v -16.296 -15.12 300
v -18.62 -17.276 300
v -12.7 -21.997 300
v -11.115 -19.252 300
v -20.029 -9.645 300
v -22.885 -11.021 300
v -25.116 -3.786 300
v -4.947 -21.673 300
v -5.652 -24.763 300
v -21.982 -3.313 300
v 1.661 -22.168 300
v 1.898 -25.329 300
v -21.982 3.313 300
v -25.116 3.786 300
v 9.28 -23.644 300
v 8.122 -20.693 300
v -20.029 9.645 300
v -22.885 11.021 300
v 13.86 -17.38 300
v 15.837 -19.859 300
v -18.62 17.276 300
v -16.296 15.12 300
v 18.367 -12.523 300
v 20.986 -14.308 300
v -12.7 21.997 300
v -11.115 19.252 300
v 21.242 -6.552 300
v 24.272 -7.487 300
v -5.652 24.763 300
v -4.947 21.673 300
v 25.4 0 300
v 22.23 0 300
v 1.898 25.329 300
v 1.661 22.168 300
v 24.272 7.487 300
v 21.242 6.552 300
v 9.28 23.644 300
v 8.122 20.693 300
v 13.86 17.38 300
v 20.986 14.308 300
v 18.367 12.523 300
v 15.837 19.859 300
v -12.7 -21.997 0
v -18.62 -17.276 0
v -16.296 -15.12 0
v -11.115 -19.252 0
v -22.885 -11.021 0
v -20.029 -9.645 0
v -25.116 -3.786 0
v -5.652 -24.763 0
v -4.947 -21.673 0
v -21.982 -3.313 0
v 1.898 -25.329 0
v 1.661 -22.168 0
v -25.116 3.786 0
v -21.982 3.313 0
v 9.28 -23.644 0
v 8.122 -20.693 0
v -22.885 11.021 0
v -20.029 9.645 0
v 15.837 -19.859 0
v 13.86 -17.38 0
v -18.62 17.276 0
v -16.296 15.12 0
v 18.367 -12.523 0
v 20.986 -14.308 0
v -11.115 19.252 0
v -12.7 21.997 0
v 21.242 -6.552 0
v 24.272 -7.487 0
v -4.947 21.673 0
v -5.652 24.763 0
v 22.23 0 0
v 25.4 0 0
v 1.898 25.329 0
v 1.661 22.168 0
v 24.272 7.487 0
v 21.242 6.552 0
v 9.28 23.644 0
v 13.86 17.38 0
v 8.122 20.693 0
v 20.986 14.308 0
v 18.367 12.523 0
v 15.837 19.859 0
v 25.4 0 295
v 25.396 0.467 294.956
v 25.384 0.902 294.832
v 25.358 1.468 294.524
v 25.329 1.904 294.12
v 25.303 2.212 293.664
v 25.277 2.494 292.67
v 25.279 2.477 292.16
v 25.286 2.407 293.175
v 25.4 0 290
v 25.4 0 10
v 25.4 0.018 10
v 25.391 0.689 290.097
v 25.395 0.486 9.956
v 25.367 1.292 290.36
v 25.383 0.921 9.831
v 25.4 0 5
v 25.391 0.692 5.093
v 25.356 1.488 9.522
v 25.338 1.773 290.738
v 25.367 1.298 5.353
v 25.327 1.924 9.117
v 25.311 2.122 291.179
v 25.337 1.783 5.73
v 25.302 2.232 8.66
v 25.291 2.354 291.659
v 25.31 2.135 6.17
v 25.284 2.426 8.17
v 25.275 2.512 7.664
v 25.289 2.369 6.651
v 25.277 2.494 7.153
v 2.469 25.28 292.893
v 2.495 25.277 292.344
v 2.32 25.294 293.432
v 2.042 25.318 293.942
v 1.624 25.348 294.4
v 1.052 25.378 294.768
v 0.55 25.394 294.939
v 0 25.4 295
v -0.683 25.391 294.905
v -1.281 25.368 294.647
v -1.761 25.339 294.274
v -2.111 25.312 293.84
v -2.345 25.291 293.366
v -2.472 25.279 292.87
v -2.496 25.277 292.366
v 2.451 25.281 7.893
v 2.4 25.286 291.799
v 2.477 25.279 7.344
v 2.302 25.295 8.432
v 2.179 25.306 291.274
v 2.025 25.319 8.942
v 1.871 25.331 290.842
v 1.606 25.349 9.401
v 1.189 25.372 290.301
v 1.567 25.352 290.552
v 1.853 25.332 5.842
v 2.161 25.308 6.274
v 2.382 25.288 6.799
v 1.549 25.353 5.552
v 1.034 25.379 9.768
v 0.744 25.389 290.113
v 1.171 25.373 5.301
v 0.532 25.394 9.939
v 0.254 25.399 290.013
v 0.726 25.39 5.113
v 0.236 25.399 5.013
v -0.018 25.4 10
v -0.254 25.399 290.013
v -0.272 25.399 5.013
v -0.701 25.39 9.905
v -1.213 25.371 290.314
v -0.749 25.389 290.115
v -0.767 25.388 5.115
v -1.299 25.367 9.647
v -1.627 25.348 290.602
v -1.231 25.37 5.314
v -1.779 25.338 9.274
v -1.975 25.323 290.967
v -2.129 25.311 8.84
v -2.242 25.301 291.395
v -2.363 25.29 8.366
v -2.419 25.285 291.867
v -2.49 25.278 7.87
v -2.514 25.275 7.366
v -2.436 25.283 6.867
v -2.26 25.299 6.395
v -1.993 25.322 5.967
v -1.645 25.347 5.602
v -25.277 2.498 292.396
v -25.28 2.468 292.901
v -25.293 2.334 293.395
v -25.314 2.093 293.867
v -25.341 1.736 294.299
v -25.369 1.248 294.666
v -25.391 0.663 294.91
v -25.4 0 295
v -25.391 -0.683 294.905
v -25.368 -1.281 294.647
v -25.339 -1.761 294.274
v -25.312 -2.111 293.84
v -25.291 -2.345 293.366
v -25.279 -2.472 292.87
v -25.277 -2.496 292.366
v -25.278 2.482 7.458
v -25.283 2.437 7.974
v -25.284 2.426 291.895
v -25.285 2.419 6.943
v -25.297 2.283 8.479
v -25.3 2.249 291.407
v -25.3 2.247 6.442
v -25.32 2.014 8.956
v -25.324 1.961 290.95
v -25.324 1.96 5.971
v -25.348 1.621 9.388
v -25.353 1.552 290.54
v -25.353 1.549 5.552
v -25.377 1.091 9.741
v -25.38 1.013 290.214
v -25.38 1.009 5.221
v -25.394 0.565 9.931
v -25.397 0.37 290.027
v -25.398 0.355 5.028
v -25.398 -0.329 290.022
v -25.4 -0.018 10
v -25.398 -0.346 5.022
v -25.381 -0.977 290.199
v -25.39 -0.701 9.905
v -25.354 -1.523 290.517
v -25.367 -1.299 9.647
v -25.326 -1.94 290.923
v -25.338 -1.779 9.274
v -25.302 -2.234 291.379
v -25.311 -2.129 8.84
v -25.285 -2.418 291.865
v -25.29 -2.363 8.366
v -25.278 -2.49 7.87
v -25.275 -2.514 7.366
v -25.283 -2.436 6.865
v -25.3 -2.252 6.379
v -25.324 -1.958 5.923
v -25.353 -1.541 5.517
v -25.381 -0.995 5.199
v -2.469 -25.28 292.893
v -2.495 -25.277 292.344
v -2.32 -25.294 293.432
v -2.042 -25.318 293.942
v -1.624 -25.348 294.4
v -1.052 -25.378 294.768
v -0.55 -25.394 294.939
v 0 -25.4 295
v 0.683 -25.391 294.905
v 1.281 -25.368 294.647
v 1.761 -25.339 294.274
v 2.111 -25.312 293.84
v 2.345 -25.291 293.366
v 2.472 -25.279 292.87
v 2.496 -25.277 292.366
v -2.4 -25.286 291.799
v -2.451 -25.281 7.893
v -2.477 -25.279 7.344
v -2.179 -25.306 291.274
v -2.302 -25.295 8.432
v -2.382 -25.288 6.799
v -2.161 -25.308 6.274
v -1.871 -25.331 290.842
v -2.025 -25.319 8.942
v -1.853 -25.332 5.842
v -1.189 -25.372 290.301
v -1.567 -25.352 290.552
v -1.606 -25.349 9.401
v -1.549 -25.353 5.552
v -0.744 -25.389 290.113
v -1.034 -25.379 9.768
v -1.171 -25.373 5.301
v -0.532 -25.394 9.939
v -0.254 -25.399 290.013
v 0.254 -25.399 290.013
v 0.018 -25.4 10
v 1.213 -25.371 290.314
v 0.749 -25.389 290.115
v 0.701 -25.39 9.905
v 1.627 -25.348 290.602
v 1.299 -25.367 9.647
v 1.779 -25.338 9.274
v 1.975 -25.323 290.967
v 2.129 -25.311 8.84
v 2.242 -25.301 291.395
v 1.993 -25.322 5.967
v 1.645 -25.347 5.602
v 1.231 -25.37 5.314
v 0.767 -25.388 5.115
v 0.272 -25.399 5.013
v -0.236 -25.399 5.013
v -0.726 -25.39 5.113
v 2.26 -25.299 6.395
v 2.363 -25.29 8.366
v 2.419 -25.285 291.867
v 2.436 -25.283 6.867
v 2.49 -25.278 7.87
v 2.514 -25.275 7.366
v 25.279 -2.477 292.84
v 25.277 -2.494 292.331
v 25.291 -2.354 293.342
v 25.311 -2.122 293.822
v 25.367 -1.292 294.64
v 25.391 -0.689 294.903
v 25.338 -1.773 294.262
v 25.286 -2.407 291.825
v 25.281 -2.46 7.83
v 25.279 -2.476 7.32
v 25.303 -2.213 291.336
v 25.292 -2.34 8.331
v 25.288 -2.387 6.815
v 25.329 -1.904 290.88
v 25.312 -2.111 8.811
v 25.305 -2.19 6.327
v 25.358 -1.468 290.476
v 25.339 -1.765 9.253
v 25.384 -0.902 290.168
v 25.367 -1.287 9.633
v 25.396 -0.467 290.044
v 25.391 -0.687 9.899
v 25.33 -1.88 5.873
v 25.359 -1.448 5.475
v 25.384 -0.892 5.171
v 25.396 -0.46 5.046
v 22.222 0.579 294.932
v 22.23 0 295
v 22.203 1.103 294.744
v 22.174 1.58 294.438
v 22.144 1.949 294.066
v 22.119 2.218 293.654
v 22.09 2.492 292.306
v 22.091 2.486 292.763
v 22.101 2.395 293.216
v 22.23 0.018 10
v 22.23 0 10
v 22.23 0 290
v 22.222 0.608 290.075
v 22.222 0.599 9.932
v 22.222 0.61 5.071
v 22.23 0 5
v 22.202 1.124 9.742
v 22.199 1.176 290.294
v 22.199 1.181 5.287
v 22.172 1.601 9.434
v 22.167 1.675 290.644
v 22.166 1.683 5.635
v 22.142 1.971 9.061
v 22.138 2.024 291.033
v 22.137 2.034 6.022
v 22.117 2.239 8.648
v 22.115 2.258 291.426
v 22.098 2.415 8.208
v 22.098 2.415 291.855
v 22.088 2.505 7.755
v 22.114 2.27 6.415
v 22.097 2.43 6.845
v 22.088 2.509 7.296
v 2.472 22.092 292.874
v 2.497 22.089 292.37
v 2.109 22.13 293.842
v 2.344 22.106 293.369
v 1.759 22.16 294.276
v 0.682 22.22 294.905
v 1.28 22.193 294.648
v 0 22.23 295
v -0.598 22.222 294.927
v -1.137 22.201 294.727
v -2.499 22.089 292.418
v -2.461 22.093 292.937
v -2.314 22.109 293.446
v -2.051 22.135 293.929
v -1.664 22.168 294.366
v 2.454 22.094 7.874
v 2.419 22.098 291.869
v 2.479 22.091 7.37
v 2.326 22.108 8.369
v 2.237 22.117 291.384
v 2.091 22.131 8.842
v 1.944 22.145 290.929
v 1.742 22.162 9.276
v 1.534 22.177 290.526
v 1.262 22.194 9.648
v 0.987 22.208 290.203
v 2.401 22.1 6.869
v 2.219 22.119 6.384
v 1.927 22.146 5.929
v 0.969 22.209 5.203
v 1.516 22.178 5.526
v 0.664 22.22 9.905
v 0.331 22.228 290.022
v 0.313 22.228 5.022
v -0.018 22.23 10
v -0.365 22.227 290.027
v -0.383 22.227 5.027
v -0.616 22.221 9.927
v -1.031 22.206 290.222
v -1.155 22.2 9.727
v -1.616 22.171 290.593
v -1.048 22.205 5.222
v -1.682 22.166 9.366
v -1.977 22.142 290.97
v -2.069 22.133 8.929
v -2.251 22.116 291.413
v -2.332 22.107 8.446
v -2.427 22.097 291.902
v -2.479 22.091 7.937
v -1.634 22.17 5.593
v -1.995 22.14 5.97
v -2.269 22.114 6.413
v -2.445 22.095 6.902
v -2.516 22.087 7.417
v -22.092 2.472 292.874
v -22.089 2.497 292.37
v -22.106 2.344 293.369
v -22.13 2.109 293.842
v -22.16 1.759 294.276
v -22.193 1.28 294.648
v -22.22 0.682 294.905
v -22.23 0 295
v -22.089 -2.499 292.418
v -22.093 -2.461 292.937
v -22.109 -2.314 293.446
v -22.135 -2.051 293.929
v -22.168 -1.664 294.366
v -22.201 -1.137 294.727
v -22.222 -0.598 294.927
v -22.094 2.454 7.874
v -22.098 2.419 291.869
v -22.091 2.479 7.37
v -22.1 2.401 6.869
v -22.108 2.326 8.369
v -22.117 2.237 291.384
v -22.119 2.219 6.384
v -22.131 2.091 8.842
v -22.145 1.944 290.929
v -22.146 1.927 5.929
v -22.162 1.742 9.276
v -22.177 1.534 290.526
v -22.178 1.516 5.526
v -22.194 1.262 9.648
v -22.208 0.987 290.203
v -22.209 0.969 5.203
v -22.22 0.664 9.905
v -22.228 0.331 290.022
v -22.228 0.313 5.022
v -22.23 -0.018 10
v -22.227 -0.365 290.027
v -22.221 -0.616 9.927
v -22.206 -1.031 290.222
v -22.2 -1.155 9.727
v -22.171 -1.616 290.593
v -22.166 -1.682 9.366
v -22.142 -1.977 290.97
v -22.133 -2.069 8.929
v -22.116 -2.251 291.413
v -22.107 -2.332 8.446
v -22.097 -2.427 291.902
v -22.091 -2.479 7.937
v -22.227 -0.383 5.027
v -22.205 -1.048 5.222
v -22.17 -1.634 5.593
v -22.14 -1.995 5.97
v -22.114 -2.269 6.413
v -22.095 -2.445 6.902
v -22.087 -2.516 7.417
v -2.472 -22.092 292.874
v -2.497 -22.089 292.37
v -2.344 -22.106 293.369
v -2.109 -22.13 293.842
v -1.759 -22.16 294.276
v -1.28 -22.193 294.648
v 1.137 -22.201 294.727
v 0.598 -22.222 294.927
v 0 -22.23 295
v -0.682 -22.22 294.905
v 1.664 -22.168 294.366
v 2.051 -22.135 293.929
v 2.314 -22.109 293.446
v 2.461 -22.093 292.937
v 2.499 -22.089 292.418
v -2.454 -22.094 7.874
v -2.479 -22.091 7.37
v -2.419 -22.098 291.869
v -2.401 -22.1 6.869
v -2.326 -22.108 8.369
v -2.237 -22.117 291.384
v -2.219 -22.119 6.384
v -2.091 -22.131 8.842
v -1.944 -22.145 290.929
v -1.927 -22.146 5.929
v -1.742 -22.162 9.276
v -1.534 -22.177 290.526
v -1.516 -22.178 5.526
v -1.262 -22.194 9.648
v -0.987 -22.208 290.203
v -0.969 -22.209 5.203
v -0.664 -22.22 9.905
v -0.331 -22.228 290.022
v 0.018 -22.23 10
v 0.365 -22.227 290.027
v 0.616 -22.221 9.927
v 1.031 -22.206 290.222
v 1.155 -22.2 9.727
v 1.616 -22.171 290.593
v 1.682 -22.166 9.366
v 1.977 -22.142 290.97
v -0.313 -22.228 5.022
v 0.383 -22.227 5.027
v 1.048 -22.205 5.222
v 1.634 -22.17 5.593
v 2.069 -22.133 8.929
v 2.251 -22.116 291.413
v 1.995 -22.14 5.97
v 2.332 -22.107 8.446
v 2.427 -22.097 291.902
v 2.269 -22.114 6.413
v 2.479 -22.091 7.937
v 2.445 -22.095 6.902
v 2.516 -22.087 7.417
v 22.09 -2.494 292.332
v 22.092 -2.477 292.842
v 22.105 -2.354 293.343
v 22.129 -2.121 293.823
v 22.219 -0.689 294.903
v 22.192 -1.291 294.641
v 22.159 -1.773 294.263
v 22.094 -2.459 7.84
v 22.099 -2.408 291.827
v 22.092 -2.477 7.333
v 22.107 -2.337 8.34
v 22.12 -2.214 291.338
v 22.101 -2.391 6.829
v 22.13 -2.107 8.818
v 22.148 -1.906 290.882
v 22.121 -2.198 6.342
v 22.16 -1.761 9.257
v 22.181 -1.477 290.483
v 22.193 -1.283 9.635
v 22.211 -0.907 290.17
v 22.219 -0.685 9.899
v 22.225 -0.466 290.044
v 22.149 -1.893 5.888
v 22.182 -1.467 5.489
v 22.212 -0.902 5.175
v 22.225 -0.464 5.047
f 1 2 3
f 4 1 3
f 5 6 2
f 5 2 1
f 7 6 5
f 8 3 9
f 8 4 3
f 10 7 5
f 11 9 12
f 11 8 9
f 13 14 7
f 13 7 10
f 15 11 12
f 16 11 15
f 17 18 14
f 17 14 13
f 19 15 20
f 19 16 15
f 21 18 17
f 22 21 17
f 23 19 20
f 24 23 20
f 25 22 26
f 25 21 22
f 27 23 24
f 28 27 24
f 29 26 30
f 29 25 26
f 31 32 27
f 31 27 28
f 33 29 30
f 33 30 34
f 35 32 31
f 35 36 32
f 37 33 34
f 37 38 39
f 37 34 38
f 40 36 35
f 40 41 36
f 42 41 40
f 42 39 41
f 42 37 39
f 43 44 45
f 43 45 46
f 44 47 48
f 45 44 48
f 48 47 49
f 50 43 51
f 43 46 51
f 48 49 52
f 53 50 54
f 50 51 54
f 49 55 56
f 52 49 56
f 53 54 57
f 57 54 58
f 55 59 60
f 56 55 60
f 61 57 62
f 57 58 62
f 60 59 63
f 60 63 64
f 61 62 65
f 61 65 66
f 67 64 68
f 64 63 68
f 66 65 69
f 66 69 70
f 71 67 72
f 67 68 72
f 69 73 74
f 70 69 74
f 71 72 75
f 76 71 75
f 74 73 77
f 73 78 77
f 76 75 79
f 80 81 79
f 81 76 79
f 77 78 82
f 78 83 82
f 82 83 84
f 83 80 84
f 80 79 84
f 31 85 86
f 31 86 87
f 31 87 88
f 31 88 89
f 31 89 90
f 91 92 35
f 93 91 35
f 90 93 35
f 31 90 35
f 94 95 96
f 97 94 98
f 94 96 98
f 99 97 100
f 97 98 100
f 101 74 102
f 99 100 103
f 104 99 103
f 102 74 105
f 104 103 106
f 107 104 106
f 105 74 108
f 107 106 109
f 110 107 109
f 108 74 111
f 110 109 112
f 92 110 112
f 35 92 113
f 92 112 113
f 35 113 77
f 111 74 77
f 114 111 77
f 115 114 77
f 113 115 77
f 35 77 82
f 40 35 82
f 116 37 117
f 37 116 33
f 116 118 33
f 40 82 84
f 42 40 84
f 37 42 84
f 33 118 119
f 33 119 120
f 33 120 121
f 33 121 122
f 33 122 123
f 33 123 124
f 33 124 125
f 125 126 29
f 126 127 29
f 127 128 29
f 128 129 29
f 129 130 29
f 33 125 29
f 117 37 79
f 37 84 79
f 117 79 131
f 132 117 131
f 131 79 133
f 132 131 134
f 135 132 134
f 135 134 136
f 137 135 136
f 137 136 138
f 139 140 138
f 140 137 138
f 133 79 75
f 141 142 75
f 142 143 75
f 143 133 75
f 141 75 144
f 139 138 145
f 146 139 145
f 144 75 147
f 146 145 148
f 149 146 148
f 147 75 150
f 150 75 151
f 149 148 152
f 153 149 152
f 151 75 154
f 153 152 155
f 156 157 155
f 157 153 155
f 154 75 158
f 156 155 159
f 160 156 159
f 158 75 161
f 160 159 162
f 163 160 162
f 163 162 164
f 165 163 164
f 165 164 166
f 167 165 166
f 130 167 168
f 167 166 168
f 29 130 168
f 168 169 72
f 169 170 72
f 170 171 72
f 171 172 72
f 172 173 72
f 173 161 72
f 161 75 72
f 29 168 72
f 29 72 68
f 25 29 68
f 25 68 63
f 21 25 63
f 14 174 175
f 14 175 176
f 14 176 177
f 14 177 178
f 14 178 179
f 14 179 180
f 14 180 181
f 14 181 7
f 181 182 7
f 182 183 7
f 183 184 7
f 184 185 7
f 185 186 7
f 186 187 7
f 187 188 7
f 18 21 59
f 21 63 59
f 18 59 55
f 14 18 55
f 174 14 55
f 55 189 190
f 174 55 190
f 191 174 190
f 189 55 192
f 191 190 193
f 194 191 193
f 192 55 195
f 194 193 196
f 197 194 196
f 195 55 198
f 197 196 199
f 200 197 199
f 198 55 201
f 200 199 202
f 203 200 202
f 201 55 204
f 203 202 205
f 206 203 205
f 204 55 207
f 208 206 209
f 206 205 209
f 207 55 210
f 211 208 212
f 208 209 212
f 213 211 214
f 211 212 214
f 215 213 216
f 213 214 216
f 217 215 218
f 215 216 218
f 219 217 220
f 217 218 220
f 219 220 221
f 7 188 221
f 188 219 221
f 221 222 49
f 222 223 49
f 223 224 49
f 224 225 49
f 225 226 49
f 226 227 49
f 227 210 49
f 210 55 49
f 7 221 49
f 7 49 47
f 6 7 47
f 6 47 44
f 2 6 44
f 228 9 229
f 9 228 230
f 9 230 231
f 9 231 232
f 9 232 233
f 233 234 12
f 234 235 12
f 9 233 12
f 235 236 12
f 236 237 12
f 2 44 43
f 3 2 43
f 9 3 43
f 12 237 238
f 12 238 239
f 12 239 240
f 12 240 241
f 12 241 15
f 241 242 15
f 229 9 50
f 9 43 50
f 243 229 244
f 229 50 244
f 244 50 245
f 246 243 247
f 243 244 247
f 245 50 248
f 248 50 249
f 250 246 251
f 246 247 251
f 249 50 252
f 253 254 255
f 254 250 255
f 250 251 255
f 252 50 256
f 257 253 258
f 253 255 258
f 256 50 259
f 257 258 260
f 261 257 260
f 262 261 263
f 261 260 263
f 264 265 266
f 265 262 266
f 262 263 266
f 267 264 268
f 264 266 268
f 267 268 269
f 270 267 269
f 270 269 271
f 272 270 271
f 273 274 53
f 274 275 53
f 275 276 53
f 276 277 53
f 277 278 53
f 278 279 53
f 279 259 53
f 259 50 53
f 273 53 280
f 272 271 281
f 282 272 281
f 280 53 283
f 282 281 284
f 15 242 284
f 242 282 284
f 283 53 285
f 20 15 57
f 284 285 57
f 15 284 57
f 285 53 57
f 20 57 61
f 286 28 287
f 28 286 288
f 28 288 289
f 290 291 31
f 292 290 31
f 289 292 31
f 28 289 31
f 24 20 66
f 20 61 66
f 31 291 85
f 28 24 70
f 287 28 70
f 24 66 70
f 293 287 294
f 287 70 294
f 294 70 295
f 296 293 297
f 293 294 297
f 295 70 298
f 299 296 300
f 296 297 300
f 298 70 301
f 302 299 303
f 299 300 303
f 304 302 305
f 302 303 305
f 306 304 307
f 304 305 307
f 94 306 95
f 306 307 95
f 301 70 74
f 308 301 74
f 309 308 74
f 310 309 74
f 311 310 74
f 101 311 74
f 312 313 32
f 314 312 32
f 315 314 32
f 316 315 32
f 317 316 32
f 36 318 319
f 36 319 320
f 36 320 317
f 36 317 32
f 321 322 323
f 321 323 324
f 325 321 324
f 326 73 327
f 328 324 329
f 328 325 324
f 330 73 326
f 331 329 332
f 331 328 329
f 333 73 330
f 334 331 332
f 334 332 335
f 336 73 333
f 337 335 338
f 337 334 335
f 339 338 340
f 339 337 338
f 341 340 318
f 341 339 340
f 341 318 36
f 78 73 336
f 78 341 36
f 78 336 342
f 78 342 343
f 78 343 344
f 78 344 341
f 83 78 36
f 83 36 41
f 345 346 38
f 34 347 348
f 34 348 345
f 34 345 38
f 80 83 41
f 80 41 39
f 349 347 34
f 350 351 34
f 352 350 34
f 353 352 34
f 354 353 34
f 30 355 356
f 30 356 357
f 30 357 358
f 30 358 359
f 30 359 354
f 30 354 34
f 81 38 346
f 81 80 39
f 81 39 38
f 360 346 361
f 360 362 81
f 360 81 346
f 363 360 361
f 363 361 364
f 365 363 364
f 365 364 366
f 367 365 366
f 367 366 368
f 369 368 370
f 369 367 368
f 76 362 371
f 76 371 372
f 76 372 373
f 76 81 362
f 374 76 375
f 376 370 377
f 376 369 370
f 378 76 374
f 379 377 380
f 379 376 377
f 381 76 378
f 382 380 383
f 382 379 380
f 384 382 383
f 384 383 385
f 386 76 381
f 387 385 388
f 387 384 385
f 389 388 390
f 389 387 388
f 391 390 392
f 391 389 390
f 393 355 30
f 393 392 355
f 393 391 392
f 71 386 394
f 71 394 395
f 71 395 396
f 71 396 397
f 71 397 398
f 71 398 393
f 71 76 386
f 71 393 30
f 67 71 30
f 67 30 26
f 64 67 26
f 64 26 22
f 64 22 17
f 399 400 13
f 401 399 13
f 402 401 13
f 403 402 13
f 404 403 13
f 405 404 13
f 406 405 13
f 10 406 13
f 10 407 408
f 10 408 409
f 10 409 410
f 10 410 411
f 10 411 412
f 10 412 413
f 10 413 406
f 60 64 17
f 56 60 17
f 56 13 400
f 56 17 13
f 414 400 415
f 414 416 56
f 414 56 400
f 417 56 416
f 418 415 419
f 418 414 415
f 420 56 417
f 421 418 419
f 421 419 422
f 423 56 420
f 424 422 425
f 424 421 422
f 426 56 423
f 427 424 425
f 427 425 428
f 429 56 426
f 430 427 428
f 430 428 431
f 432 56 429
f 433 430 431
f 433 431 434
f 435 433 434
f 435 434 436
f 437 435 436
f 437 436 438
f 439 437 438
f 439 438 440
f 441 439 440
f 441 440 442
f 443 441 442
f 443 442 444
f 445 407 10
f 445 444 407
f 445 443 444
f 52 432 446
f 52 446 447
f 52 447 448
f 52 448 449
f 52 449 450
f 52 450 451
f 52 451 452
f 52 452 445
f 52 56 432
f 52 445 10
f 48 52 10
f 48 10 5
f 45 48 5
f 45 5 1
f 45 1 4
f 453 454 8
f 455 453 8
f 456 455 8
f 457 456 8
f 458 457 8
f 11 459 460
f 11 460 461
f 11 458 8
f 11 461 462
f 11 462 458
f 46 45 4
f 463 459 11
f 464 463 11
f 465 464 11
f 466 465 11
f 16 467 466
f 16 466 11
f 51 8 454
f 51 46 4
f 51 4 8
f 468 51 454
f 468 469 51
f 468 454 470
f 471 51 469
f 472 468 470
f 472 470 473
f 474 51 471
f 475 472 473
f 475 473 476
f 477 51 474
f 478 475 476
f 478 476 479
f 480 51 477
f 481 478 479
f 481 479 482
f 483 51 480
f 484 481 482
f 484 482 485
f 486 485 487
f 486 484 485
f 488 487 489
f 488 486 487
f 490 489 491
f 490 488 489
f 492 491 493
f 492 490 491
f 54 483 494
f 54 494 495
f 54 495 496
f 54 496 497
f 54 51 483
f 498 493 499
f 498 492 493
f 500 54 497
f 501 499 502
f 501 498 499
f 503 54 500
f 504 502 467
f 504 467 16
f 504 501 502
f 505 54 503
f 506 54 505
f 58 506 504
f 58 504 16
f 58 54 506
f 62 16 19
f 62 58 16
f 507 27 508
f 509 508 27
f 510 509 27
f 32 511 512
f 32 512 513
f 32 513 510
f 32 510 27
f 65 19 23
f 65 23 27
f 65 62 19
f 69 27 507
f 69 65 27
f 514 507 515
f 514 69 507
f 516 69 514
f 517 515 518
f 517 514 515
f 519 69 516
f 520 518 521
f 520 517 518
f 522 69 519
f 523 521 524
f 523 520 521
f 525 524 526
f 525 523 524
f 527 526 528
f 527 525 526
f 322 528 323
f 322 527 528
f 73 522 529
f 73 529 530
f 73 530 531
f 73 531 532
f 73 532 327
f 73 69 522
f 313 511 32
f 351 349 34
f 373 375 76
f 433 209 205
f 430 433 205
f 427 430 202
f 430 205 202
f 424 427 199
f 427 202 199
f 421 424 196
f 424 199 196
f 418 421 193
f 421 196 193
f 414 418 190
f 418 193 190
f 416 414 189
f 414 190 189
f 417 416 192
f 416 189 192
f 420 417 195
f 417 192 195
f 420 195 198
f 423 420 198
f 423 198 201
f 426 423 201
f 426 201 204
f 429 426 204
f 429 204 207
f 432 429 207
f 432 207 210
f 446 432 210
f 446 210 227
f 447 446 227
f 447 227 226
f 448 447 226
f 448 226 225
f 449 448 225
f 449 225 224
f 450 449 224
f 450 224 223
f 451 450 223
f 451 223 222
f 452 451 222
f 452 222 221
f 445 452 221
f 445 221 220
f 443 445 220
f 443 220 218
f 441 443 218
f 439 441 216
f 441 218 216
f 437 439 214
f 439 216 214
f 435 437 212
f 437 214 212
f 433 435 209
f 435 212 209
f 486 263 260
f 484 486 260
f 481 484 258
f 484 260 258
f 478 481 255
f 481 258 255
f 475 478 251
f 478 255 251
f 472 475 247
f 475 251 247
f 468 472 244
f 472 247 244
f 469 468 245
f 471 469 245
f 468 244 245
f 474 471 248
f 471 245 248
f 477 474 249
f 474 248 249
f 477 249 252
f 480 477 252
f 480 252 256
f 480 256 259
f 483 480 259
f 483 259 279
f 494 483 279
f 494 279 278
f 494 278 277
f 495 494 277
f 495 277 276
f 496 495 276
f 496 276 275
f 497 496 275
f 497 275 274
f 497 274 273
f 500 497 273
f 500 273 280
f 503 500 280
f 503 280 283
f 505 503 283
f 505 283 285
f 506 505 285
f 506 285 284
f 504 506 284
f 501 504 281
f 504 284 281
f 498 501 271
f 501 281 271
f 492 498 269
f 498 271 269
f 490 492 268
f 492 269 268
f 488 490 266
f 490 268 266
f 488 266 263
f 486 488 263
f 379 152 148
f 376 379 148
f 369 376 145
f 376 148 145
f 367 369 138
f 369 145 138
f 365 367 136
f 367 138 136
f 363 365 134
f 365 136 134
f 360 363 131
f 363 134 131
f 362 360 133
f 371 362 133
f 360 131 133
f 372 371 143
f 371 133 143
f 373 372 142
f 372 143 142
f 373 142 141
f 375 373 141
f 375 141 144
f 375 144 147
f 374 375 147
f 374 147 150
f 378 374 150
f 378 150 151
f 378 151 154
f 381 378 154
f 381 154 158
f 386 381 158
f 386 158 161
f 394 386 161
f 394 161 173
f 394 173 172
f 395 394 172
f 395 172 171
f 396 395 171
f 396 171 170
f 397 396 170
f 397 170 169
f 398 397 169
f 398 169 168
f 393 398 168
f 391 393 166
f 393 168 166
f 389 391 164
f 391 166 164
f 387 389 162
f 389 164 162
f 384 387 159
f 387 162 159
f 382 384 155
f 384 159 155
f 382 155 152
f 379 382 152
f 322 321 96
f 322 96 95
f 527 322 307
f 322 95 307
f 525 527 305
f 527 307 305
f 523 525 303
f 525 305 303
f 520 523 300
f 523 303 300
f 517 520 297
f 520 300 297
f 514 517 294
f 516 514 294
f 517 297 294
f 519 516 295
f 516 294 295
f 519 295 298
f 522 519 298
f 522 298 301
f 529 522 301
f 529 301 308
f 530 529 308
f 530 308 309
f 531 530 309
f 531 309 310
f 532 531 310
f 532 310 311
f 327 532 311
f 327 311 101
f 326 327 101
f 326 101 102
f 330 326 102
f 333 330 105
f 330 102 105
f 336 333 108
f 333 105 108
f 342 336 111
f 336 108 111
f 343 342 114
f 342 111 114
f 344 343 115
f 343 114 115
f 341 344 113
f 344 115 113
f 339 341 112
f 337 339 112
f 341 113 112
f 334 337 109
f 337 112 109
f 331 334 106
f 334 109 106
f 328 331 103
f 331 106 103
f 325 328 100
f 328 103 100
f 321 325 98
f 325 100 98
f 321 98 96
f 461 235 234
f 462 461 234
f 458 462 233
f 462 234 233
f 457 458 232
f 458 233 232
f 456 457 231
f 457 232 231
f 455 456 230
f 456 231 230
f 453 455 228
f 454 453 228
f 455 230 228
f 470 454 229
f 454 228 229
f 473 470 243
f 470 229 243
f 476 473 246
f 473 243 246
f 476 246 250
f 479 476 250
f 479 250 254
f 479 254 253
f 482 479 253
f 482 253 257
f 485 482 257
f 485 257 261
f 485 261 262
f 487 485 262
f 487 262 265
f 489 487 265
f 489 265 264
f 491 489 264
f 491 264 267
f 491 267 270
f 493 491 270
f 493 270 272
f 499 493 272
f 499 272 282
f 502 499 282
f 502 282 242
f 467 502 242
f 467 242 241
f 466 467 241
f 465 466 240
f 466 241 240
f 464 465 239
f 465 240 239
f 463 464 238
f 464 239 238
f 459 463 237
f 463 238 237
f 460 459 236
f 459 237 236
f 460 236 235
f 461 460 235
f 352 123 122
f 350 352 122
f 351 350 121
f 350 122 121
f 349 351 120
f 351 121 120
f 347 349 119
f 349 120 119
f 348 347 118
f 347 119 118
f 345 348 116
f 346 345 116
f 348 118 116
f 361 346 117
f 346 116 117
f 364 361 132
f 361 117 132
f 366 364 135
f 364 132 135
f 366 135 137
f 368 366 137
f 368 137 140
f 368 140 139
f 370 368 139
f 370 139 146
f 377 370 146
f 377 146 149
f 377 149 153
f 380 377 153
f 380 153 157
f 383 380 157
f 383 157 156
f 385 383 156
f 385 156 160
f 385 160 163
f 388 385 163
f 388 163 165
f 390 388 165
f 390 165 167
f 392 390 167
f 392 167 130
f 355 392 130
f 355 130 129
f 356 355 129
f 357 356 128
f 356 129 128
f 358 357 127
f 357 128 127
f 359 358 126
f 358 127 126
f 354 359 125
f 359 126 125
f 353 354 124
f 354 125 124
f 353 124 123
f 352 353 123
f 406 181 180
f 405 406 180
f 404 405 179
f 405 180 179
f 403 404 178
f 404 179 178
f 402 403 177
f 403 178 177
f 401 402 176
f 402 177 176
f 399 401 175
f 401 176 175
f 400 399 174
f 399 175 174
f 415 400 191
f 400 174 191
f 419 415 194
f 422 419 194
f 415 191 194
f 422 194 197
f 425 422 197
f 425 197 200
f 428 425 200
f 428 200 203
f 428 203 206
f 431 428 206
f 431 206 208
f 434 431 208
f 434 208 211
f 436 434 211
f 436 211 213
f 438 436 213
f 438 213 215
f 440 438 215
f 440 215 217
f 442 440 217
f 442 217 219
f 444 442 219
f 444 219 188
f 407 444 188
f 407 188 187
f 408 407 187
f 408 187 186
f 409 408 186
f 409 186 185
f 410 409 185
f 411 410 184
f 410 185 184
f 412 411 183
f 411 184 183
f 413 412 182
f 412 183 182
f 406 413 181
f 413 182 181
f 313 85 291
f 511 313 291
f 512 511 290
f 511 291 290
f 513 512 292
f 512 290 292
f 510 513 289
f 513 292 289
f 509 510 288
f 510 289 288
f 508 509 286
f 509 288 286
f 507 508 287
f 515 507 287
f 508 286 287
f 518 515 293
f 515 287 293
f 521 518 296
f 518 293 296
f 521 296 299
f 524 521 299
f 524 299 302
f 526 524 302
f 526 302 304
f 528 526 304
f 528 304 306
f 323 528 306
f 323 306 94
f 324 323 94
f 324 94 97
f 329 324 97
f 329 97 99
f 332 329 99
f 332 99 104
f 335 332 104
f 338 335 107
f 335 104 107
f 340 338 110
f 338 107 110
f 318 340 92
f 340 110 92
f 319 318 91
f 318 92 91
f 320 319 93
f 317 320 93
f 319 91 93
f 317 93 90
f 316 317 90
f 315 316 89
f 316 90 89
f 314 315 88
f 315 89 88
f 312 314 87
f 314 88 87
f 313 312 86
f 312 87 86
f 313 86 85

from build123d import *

# Parameters (mm, degrees)
ESBO_O1_R                  = 25.4
ESBO_O1_R_2                = 22.23
RESSALTO_EXTRUS_O1_DEPTH   = 300
CORTE_EXTRUS_O1_REACH      = 307.329
CORTE_EXTRUS_O1_END_RADIUS = 22.23
ESBO_O3_R                  = 2.5
PADR_OCIRCULAR1_COUNT      = 4
CORTE_EXTRUS_O2_REACH      = 307.329
CORTE_EXTRUS_O2_END_RADIUS = 22.23
ESBO_O4_R                  = 2.5
PADR_OCIRCULAR2_COUNT      = 4


with BuildPart() as part:
    # Esbo_o1 → Ressalto-extrus_o1 (new body)
    with BuildSketch(Plane.XY):
        Circle(ESBO_O1_R)
        Circle(ESBO_O1_R_2, mode=Mode.SUBTRACT)
    extrude(amount=RESSALTO_EXTRUS_O1_DEPTH)

    # Corte-extrus_o1: up to this cylinder (the profile starts outside it)
    corte_extrus_o1_end = Plane(origin=(0, 0, 292.5), z_dir=(0, 0, -1)) * Cylinder(CORTE_EXTRUS_O1_END_RADIUS, 660.118, mode=Mode.PRIVATE)
    # Esbo_o3 → Corte-extrus_o1 (cut, up to the surface)
    with BuildSketch(Plane(origin=(0, 25.4, 0), x_dir=(1, 0, 0), z_dir=(0, 1, 0)), mode=Mode.PRIVATE) as corte_extrus_o1_sk1:
        with Locations(Location((0, -292.5, 0), (0, 0, 270))):
            Circle(ESBO_O3_R)
    corte_extrus_o1_tool1 = extrude(corte_extrus_o1_sk1.sketch, amount=-CORTE_EXTRUS_O1_REACH, mode=Mode.PRIVATE) - corte_extrus_o1_end
    corte_extrus_o1 = corte_extrus_o1_tool1.solids().sort_by_distance((0, 25.4, 292.5))[0]
    add(corte_extrus_o1, mode=Mode.SUBTRACT)

    # Padr_oCircular1: Corte-extrus_o1 ×4 about axis
    padr_ocircular1_axis = Axis((0, 0, 300), (0, 0, 1))
    for i in range(1, PADR_OCIRCULAR1_COUNT):
        add(corte_extrus_o1.rotate(padr_ocircular1_axis, i * 360 / PADR_OCIRCULAR1_COUNT), mode=Mode.SUBTRACT)

    # Corte-extrus_o2: up to this cylinder (the profile starts outside it)
    corte_extrus_o2_end = Plane(origin=(0, 0, 7.5), z_dir=(0, 0, -1)) * Cylinder(CORTE_EXTRUS_O2_END_RADIUS, 660.118, mode=Mode.PRIVATE)
    # Esbo_o4 → Corte-extrus_o2 (cut, up to the surface)
    with BuildSketch(Plane(origin=(0, 25.4, 0), x_dir=(1, 0, 0), z_dir=(0, 1, 0)), mode=Mode.PRIVATE) as corte_extrus_o2_sk1:
        with Locations(Location((-0.017770346, -7.5, 0), (0, 0, 270))):
            Circle(ESBO_O4_R)
    corte_extrus_o2_tool1 = extrude(corte_extrus_o2_sk1.sketch, amount=-CORTE_EXTRUS_O2_REACH, mode=Mode.PRIVATE) - corte_extrus_o2_end
    corte_extrus_o2 = corte_extrus_o2_tool1.solids().sort_by_distance((-0.01777, 25.4, 7.5))[0]
    add(corte_extrus_o2, mode=Mode.SUBTRACT)

    # Padr_oCircular2: Corte-extrus_o2 ×4 about axis
    padr_ocircular2_axis = Axis((0, 0, 0), (0, 0, 1))
    for i in range(1, PADR_OCIRCULAR2_COUNT):
        add(corte_extrus_o2.rotate(padr_ocircular2_axis, i * 360 / PADR_OCIRCULAR2_COUNT), mode=Mode.SUBTRACT)


solid = part.part
